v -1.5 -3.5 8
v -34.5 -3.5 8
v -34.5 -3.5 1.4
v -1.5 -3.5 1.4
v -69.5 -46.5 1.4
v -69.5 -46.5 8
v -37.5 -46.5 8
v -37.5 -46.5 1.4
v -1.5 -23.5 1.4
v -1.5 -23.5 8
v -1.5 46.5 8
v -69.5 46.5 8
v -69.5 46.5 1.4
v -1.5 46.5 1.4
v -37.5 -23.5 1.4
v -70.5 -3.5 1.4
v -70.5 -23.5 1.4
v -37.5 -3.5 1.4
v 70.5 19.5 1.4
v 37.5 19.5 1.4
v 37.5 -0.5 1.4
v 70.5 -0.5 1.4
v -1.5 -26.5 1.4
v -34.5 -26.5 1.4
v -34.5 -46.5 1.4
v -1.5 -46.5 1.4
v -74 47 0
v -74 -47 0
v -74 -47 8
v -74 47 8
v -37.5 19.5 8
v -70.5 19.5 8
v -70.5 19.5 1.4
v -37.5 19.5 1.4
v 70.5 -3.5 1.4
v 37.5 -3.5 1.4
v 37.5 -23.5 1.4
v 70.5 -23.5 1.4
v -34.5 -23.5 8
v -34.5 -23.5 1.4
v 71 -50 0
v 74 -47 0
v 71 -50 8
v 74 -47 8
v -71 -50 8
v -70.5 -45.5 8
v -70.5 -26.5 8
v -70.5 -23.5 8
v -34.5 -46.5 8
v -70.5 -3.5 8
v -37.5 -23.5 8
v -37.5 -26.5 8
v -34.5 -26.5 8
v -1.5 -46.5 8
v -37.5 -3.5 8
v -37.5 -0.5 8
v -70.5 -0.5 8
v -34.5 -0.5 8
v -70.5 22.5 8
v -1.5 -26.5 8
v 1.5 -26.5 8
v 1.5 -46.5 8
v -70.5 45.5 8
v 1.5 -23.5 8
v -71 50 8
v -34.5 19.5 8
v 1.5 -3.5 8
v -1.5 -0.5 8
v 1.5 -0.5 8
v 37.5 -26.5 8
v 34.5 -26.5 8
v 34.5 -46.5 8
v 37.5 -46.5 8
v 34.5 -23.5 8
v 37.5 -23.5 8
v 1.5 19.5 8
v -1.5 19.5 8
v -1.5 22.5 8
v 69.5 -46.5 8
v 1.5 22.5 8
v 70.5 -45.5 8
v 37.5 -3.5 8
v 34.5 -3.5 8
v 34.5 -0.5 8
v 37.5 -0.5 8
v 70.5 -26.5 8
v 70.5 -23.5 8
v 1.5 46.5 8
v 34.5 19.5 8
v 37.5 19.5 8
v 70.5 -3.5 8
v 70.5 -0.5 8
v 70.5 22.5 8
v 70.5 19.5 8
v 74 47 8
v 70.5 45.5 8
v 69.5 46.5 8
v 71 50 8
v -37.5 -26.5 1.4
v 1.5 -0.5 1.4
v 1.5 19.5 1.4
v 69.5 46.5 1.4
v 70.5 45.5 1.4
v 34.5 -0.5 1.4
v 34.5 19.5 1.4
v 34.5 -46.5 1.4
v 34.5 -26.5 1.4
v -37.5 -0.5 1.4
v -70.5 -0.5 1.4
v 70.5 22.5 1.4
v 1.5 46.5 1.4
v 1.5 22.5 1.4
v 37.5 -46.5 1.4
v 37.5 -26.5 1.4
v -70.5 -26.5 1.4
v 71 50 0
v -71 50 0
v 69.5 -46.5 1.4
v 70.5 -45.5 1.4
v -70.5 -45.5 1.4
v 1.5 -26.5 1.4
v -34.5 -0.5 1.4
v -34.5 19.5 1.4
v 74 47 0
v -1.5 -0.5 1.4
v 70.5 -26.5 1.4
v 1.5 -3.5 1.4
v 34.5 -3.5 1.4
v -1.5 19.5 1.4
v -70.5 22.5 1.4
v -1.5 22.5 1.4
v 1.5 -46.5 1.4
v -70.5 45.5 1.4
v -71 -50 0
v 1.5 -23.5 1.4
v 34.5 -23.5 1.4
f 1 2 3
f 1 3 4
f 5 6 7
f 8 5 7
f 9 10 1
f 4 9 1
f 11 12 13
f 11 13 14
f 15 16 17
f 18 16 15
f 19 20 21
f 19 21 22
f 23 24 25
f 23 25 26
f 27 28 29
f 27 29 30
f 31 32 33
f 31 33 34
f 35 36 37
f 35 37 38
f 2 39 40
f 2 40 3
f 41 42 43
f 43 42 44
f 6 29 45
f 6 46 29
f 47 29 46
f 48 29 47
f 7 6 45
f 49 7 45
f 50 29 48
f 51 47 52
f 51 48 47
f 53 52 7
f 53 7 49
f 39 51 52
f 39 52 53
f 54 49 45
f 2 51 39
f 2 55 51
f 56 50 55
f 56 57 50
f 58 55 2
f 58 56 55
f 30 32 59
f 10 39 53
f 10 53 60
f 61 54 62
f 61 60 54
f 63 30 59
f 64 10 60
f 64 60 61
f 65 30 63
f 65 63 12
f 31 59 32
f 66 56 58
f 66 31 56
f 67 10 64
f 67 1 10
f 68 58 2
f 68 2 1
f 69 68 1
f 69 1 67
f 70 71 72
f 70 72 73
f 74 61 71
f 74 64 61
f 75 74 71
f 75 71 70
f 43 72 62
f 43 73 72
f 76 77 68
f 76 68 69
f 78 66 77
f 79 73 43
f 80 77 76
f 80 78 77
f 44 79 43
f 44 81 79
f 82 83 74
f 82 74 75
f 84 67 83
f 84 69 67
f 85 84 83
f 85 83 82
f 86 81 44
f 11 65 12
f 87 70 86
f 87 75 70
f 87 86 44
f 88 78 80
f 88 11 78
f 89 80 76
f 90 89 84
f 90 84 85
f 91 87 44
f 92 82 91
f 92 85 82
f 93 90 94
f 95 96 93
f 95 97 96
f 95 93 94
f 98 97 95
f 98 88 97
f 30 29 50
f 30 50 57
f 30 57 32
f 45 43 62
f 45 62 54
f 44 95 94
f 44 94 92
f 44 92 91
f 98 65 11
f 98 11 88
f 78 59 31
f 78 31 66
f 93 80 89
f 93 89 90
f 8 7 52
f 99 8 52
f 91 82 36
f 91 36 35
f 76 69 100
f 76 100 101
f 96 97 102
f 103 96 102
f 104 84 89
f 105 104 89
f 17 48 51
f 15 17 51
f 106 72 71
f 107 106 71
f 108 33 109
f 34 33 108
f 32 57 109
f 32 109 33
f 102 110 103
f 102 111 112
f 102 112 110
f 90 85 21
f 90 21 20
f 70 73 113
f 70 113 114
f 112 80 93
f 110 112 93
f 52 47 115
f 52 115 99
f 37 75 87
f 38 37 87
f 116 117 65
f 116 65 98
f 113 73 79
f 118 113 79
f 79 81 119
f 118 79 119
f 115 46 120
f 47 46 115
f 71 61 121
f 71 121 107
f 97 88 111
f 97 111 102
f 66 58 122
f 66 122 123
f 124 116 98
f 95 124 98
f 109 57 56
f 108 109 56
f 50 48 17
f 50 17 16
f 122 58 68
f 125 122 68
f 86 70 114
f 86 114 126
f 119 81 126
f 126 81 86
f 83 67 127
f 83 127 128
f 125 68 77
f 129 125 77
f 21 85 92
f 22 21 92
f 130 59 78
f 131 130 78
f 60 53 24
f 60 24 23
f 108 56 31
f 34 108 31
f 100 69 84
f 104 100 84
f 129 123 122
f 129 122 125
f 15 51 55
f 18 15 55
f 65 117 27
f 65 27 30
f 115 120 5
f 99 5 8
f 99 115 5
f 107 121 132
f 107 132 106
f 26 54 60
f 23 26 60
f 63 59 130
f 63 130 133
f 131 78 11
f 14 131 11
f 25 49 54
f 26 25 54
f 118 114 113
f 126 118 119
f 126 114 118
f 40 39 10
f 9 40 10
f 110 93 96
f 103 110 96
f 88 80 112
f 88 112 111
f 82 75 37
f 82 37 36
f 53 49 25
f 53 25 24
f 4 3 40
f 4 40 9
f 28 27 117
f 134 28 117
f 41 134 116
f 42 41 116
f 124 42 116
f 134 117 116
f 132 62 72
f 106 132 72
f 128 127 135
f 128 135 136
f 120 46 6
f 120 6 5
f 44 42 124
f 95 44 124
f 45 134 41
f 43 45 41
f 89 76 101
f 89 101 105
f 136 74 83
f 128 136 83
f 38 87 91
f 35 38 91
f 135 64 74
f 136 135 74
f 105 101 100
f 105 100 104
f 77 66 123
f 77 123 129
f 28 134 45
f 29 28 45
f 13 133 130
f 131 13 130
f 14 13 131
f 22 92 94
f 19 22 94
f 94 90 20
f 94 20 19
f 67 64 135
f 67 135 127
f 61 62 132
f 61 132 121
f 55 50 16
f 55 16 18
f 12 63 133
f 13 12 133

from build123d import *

# Parameters (mm, degrees)
F0_W     = 148
F0_H     = 100
F1_DEPTH = 8
F2_SIZE  = 3
F3_W     = 69
F3_H     = 24
F3_W_2   = 33
F3_H_2   = 20
F4_DEPTH = 6.6
F5_SIZE  = 1


with BuildPart() as f1:
    # F0 (on Top) → F1 (new body)
    with BuildSketch(Plane.XY):
        Rectangle(F0_W, F0_H)
    extrude(amount=F1_DEPTH)

    # F2
    f2_edges = [f1.edges().sort_by_distance(p)[0] for p in [
        (-74, -50, 4),
        (-74, 50, 4),
        (74, 50, 4),
        (74, -50, 4),
    ]]
    chamfer(f2_edges, length=F2_SIZE)

    # F3 (on face) → F4 (cut)
    with BuildSketch(Plane.XY.offset(8)):
        with Locations((-36, 34.5)):
            Rectangle(F3_W, F3_H)
        with Locations((36, 34.5)):
            Rectangle(F3_W, F3_H)
        with Locations((-54, 9.5)):
            Rectangle(F3_W_2, F3_H_2)
        with Locations((-18, 9.5)):
            Rectangle(F3_W_2, F3_H_2)
        with Locations((18, 9.5)):
            Rectangle(F3_W_2, F3_H_2)
        with Locations((54, 9.5)):
            Rectangle(F3_W_2, F3_H_2)
        with Locations((54, -13.5)):
            Rectangle(F3_W_2, F3_H_2)
        with Locations((18, -13.5)):
            Rectangle(F3_W_2, F3_H_2)
        with Locations((-18, -13.5)):
            Rectangle(F3_W_2, F3_H_2)
        with Locations((-54, -13.5)):
            Rectangle(F3_W_2, F3_H_2)
        with Locations((-54, -36.5)):
            Rectangle(F3_W_2, F3_H_2)
        with Locations((-18, -36.5)):
            Rectangle(F3_W_2, F3_H_2)
        with Locations((18, -36.5)):
            Rectangle(F3_W_2, F3_H_2)
        with Locations((54, -36.5)):
            Rectangle(F3_W_2, F3_H_2)
    extrude(amount=-F4_DEPTH, mode=Mode.SUBTRACT)

    # F5
    f5_edges = [f1.edges().sort_by_distance(p)[0] for p in [
        (70.5, 46.5, 4.7),
        (-70.5, 46.5, 4.7),
        (70.5, -46.5, 4.7),
        (-70.5, -46.5, 4.7),
    ]]
    chamfer(f5_edges, length=F5_SIZE)


solid = f1.part
